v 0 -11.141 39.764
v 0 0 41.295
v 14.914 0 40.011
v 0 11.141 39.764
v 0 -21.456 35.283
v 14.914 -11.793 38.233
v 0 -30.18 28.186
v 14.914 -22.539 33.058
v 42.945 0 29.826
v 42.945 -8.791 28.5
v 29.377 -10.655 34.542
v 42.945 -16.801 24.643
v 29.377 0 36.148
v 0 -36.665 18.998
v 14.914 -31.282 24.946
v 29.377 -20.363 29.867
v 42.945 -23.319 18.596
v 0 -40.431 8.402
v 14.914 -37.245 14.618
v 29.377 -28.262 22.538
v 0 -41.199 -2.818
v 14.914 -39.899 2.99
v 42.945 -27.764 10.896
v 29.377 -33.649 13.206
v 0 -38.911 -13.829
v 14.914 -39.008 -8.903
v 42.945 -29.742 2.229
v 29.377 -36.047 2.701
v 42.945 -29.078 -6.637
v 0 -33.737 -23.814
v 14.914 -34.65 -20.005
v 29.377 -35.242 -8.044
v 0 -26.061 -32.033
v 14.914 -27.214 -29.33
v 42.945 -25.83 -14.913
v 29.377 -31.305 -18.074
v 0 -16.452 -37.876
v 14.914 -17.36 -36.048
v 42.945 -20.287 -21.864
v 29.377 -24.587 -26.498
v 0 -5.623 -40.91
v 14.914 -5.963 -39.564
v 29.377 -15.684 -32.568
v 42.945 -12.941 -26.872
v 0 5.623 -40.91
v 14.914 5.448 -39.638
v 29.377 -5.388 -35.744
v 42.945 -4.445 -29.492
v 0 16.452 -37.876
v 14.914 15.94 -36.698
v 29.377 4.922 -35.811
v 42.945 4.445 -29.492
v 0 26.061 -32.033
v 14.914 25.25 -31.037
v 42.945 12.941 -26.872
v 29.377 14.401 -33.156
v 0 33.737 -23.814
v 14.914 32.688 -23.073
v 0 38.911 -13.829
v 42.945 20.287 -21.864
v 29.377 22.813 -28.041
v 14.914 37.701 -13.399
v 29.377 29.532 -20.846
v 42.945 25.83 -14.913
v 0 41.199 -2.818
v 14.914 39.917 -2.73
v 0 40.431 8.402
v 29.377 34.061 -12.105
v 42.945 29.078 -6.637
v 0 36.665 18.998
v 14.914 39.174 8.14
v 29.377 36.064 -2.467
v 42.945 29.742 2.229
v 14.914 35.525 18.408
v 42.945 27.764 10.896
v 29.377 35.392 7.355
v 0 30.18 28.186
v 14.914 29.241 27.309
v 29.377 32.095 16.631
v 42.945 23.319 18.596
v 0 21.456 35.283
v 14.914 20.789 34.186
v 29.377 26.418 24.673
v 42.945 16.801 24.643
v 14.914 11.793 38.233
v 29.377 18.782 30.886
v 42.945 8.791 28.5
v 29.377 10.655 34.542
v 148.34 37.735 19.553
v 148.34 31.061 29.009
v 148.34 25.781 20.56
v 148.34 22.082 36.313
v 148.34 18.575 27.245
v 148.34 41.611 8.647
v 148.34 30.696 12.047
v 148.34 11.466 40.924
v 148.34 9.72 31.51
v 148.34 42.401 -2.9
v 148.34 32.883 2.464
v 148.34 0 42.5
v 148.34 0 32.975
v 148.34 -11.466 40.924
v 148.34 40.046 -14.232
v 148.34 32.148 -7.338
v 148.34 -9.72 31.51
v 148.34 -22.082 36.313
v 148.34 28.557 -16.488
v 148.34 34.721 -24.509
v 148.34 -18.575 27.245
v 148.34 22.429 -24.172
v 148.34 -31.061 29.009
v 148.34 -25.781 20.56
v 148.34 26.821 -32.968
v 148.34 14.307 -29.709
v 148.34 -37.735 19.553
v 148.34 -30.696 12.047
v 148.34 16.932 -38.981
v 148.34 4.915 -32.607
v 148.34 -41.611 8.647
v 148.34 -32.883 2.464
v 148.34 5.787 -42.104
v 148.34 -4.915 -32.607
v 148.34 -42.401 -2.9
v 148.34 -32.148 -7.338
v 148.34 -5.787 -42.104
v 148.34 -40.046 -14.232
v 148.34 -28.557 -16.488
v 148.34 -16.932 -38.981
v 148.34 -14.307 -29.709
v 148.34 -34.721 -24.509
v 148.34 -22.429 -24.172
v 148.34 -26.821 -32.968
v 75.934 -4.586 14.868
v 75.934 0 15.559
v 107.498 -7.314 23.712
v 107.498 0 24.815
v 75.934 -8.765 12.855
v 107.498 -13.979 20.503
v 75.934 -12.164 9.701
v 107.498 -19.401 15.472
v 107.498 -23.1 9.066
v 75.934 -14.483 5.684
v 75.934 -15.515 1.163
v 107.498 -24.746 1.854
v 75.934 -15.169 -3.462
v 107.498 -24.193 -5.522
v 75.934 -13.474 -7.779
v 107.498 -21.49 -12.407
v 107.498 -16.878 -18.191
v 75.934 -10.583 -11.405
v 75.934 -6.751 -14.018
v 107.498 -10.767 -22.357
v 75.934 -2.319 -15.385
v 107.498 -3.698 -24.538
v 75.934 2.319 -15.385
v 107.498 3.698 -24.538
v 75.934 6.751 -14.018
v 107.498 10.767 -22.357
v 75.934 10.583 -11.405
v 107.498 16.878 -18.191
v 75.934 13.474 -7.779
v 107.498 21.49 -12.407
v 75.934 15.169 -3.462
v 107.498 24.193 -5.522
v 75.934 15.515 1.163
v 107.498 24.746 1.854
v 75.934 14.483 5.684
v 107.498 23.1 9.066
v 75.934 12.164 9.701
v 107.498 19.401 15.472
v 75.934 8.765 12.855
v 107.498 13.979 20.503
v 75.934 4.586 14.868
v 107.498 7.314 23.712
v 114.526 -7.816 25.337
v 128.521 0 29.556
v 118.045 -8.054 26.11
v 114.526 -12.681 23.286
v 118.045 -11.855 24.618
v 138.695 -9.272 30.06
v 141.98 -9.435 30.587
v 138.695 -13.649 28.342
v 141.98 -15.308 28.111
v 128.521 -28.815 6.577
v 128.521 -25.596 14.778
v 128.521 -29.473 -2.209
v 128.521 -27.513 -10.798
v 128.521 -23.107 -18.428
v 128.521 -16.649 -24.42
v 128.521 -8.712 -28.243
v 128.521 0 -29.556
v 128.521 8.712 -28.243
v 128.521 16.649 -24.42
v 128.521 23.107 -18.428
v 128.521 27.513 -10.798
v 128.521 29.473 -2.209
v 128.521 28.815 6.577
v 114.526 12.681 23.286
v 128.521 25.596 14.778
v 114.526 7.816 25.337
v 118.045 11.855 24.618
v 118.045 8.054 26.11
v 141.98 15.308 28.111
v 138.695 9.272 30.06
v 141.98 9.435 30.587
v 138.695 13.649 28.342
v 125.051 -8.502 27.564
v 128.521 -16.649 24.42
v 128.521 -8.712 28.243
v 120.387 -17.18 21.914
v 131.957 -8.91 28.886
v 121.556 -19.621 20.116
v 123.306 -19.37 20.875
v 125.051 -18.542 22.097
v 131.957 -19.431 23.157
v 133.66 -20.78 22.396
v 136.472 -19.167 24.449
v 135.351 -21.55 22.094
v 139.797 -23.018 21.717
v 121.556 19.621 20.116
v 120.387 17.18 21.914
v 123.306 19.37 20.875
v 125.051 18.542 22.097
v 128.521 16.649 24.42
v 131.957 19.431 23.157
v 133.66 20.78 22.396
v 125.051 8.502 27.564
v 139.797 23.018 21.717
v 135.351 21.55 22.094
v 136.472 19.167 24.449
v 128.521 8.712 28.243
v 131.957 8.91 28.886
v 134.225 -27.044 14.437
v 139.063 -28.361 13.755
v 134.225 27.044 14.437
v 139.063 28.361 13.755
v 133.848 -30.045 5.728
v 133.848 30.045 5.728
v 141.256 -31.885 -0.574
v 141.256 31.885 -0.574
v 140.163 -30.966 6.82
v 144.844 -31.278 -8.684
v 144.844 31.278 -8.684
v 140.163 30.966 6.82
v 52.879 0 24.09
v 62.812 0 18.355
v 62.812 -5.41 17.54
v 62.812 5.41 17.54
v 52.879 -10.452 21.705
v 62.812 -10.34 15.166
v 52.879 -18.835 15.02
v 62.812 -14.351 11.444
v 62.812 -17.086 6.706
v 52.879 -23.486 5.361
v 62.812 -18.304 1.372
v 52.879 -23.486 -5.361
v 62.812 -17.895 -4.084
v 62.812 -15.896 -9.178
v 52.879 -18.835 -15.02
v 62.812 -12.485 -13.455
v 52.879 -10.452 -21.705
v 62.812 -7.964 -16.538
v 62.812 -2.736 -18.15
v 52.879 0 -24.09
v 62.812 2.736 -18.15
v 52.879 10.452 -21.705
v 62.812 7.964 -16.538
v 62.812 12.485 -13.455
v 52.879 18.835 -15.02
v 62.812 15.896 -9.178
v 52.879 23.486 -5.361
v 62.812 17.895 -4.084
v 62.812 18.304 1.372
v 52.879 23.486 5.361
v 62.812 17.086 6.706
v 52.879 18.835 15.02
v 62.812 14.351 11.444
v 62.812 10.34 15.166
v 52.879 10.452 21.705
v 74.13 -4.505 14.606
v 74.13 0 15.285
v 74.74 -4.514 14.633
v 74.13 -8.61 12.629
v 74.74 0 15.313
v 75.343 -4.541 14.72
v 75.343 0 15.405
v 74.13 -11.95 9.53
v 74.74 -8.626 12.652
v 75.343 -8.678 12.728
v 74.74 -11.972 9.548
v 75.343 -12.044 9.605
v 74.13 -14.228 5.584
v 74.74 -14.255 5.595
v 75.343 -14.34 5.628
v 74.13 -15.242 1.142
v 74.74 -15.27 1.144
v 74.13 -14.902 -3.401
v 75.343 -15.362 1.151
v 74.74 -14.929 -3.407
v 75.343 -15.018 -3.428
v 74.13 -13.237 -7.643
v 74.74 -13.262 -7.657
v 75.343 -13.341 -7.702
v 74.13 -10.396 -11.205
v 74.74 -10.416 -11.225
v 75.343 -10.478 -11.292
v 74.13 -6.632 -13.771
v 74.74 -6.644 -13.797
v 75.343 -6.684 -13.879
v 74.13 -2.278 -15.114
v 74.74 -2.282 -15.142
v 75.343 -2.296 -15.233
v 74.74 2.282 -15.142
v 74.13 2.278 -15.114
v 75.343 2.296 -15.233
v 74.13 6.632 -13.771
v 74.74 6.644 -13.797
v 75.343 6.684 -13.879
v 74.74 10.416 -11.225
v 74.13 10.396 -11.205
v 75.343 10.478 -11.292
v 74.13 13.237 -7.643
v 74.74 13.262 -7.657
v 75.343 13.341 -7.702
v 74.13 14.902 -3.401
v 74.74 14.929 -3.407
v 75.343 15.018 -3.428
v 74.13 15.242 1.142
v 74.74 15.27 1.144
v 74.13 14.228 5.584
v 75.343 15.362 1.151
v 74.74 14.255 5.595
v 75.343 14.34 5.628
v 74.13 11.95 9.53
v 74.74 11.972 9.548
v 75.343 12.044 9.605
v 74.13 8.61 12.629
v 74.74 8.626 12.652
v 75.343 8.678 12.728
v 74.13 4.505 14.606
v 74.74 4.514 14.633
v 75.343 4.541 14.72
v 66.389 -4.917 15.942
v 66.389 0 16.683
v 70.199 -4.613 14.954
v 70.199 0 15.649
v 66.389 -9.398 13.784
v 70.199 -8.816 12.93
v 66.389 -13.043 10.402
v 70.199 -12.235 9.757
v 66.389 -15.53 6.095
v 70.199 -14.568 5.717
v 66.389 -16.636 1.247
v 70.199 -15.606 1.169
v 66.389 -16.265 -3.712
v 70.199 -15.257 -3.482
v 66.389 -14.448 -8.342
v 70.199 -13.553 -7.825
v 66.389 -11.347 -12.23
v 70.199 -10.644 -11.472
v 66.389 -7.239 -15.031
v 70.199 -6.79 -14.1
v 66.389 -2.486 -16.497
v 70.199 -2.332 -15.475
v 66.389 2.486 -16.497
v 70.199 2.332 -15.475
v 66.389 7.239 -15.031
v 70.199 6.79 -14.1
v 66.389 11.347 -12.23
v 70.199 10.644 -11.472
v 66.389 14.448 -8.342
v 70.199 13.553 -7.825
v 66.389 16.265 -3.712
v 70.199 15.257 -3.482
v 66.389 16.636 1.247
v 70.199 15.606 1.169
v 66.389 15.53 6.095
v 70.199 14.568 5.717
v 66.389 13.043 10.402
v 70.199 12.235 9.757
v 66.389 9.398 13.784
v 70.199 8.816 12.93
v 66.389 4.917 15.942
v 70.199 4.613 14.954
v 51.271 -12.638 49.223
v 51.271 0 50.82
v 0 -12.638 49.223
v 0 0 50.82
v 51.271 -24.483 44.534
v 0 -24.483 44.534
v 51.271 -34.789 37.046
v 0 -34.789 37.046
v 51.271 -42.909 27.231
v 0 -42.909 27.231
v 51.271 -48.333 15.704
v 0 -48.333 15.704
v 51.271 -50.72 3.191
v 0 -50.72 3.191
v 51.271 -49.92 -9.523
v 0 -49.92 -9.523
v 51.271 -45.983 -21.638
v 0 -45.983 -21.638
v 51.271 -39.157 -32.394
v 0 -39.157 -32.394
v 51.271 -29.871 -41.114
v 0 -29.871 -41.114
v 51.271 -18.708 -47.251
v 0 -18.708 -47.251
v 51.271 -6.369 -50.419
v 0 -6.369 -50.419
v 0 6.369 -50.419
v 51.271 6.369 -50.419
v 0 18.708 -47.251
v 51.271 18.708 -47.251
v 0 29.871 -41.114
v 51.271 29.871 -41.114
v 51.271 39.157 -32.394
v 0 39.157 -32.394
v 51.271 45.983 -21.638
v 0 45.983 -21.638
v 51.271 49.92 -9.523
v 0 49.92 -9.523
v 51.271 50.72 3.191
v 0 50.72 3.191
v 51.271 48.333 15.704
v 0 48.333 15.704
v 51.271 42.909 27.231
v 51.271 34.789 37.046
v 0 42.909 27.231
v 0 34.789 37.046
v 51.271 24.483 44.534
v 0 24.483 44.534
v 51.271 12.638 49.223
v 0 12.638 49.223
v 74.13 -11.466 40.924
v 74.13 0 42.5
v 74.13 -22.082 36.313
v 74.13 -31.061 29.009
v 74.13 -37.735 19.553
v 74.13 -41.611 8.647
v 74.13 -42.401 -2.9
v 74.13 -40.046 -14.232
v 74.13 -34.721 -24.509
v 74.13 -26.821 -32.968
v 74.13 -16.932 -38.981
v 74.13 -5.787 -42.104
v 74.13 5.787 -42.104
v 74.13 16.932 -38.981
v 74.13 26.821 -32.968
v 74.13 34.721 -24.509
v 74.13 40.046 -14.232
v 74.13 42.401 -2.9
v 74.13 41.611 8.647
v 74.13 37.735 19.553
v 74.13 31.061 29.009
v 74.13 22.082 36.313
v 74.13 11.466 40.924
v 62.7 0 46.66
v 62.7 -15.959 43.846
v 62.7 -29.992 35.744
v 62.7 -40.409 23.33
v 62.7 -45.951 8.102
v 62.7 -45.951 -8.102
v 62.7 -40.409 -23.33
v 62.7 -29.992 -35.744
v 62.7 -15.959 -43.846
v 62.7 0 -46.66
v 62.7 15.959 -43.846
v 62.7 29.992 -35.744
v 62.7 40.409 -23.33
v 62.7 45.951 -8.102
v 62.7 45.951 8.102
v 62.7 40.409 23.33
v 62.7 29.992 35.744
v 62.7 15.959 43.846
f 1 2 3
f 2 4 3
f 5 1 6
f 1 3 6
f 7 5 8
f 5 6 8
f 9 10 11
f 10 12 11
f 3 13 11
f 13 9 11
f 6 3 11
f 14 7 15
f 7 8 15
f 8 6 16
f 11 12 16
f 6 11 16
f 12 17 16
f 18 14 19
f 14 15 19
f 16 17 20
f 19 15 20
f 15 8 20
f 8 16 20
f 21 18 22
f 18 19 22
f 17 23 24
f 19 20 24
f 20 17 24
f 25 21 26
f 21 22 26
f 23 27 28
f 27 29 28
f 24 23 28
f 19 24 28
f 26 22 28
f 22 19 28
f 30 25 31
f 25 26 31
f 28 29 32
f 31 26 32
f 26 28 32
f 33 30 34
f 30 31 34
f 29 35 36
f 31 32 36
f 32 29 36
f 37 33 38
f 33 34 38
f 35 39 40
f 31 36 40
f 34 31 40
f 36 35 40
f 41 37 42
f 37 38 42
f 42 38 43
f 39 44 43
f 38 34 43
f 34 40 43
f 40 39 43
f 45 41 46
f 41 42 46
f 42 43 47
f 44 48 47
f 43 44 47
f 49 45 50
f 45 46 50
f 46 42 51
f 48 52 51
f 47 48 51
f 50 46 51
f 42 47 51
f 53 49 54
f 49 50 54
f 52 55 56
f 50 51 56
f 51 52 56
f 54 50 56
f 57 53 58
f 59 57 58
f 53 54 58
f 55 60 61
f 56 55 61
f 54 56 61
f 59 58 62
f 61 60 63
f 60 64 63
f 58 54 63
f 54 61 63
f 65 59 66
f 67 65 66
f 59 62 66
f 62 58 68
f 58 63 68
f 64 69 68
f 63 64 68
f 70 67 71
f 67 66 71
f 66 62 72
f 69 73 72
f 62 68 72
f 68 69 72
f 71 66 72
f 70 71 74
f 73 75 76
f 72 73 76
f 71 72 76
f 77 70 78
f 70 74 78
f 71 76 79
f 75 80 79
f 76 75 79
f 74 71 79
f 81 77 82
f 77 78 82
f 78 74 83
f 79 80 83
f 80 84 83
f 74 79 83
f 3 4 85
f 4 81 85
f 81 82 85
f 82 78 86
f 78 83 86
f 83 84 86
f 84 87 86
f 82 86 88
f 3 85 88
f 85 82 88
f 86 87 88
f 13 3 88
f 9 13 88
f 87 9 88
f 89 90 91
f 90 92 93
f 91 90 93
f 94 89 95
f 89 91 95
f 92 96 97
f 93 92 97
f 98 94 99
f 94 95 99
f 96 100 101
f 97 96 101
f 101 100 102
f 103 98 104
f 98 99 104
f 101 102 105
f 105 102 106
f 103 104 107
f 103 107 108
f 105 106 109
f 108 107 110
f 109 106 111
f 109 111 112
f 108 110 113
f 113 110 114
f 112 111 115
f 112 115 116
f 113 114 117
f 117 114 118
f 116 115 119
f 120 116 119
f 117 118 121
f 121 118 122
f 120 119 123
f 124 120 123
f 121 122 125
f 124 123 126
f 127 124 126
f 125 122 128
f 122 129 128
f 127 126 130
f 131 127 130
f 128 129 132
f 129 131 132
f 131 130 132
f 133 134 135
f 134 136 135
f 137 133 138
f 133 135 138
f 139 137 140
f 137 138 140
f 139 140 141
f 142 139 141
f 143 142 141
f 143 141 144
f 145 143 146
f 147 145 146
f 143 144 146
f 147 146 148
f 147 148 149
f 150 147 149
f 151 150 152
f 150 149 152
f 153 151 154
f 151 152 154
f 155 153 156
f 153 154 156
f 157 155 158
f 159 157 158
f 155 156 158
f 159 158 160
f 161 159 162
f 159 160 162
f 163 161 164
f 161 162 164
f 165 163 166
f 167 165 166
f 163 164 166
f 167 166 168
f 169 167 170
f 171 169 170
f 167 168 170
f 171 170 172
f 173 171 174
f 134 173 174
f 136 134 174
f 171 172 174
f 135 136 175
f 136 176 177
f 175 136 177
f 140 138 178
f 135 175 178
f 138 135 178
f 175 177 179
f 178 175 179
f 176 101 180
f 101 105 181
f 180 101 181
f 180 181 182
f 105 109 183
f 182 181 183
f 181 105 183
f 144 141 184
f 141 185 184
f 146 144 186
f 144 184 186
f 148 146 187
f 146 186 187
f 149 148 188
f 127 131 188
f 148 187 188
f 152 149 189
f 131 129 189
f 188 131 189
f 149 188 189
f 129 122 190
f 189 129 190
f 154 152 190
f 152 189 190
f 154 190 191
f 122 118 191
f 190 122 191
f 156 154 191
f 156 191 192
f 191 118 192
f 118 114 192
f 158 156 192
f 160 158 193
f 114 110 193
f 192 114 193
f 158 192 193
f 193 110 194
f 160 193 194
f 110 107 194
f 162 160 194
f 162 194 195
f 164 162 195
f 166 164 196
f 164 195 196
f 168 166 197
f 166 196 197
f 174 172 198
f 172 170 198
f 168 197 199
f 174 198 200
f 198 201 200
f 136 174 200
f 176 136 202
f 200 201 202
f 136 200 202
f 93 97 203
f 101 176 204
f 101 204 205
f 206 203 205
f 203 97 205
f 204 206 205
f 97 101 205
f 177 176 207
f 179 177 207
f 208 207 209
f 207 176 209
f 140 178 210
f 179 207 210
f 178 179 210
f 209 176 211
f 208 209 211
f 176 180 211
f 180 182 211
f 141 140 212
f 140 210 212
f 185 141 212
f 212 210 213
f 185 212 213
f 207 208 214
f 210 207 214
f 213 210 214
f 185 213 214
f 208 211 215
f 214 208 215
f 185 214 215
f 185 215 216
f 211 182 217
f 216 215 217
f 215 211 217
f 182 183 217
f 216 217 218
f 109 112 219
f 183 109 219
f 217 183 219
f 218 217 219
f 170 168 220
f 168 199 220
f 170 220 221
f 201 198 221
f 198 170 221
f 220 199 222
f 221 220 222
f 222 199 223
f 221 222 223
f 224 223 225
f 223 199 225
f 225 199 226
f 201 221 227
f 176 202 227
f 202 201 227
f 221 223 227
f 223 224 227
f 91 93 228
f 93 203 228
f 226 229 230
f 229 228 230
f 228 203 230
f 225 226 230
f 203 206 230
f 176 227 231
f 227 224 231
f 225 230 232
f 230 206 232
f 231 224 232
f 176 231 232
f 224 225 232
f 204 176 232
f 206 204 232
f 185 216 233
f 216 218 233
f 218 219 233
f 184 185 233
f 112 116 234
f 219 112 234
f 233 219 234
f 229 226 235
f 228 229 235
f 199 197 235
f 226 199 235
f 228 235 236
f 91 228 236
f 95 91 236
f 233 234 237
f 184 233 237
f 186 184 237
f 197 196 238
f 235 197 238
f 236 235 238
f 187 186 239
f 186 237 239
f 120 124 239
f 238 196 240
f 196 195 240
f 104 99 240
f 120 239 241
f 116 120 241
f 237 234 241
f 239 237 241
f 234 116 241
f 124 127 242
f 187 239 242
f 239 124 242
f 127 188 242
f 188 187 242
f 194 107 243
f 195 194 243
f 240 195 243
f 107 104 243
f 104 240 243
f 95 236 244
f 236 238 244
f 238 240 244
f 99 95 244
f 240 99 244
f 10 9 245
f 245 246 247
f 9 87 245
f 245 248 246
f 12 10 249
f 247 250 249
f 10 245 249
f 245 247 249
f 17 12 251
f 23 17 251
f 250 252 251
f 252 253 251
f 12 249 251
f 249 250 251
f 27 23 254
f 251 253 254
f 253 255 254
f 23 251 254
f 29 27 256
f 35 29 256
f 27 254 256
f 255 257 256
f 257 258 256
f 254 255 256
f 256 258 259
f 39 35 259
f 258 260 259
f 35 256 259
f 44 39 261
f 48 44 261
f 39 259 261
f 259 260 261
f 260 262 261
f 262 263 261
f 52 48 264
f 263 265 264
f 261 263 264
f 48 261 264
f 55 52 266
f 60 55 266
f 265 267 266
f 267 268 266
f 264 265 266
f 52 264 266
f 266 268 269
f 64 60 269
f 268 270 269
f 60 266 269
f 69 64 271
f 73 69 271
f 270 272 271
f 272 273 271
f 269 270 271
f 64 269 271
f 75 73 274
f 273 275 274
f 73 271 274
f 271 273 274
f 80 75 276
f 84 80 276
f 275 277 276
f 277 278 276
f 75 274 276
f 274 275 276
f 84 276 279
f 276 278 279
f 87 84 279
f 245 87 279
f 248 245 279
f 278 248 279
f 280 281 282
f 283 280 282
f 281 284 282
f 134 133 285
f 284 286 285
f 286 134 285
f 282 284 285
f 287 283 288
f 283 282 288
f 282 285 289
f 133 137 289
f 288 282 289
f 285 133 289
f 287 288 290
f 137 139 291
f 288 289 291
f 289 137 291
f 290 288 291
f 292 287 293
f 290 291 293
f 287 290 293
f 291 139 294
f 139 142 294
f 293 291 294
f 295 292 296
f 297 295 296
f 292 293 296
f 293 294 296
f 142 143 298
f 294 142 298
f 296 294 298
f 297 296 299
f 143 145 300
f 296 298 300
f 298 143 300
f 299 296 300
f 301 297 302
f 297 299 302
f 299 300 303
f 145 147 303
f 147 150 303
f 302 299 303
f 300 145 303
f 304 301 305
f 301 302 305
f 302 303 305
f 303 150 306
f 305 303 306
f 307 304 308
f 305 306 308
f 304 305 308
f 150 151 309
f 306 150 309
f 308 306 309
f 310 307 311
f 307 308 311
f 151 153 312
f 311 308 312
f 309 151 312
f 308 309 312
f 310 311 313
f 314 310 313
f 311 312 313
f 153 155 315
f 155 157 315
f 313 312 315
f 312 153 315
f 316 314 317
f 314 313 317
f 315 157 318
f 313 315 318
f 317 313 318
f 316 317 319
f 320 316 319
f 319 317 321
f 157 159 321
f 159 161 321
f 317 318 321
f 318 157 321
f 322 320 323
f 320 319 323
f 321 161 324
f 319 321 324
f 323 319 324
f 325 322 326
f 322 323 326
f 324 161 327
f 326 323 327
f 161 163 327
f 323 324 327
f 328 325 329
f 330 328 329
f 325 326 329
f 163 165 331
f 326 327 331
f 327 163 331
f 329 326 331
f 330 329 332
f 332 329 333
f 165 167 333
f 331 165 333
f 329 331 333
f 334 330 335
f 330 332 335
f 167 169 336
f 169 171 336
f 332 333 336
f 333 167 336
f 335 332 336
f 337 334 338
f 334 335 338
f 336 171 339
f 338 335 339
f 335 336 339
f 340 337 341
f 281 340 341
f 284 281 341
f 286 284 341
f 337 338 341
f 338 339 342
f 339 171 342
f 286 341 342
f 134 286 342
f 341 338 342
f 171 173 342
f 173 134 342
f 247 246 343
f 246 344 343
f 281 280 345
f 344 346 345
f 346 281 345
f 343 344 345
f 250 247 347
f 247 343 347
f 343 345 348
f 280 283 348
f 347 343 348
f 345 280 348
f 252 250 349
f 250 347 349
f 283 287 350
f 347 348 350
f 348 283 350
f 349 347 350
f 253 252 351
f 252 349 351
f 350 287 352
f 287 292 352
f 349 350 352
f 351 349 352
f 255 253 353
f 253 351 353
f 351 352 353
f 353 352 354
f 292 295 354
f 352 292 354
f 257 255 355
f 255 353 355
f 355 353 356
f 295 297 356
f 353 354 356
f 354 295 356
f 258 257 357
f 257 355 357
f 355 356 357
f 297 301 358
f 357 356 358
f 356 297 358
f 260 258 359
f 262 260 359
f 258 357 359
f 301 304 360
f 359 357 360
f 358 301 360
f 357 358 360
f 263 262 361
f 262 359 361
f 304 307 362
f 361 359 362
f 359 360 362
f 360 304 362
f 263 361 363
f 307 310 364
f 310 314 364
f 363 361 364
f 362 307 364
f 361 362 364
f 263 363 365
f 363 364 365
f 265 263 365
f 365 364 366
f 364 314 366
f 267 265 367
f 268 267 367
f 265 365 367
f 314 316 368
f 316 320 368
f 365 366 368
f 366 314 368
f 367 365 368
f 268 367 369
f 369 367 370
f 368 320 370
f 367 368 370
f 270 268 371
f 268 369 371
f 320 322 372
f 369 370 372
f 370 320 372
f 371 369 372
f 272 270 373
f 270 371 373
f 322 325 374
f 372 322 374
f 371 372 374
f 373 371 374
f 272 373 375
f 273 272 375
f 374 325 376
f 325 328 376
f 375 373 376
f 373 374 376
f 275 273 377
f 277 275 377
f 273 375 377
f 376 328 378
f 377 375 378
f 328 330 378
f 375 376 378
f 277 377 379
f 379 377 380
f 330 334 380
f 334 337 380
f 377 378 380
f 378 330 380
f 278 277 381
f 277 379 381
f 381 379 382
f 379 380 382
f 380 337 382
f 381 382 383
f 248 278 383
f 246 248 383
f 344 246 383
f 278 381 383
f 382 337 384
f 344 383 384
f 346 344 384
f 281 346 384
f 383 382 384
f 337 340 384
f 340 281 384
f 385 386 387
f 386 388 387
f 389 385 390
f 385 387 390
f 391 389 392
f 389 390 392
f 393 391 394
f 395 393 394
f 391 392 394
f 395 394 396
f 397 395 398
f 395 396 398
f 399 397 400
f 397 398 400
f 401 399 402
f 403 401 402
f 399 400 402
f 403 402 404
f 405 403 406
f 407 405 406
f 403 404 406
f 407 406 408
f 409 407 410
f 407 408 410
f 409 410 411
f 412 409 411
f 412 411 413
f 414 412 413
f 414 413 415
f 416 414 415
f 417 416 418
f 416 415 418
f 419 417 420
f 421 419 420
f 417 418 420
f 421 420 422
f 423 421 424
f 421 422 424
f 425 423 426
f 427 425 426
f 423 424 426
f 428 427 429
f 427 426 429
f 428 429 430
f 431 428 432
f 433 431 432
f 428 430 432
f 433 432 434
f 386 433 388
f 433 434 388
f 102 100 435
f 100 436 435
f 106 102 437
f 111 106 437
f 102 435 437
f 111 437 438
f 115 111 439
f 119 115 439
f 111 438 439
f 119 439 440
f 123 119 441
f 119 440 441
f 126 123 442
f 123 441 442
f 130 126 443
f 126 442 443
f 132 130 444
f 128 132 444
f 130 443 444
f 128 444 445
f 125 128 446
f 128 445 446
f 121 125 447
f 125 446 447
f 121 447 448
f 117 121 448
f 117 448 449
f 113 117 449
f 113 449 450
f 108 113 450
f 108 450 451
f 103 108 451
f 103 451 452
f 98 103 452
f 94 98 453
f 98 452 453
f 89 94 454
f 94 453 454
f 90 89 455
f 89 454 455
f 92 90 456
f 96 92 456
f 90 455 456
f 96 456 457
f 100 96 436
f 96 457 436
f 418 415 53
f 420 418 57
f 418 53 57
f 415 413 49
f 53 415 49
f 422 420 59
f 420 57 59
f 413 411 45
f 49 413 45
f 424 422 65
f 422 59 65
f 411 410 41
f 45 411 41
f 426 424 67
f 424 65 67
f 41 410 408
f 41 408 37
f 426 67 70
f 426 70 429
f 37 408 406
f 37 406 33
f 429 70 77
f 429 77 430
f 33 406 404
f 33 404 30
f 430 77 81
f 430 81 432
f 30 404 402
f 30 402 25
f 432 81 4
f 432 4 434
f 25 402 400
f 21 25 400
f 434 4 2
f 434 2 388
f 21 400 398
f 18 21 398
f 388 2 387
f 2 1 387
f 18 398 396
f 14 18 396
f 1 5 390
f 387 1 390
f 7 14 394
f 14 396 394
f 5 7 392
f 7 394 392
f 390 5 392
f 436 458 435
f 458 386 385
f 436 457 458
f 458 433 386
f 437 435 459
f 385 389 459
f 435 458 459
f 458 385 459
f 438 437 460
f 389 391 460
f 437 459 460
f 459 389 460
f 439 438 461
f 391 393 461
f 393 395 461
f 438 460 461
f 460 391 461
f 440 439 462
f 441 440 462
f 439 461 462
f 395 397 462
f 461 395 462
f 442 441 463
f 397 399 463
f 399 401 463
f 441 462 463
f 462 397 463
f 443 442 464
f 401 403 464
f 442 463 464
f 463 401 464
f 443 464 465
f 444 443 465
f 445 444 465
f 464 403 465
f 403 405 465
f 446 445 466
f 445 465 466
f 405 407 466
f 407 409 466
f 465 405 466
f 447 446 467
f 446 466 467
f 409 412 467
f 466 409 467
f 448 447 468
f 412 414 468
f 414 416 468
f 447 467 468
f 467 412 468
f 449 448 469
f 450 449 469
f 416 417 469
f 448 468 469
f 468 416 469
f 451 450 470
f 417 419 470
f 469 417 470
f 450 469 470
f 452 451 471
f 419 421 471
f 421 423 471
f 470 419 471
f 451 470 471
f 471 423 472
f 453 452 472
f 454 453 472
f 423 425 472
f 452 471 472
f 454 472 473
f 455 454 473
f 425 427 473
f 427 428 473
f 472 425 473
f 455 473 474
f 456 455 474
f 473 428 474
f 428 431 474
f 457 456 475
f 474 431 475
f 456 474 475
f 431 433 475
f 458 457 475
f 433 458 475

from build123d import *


with BuildPart() as part:
    # Sketch1 → Revolve1 (revolve)
    with BuildSketch(Plane.XY, mode=Mode.PRIVATE) as revolve1_sk:
        with BuildLine():
            Line((42.945252988, 29.825549705), (62.812385376, 18.355255472))
            ThreePointArc((62.812385376, 18.355255472), (68.271514292, 16.084070702), (74.13, 15.285))
            ThreePointArc((74.13, 15.285), (75.042634026, 15.351014858), (75.933754417, 15.558772587))
            add(Edge.make_bspline(
                [(75.933754417, 15.558772587), (97.124186968, 22.913189408), (126.012294015, 29.837045564), (148.34, 32.975)],
                knots=[0, 0, 0, 0, 1, 1, 1, 1], degree=3))
            Line((148.34, 32.975), (148.34, 42.5))
            Line((148.34, 42.5), (74.13, 42.5))
            Line((74.13, 42.5), (51.27098787, 50.82))
            Line((51.27098787, 50.82), (0, 50.82))
            Line((0, 50.82), (0, 41.295))
            ThreePointArc((0, 41.295), (22.230006991, 38.396147211), (42.945252988, 29.825549705))
        make_face()
    revolve(revolve1_sk.sketch.rotate(Axis((0, 0, 0), (1, 0, 0)), 90), axis=Axis((0, 0, 0), (1, 0, 0)))


solid = part.part
